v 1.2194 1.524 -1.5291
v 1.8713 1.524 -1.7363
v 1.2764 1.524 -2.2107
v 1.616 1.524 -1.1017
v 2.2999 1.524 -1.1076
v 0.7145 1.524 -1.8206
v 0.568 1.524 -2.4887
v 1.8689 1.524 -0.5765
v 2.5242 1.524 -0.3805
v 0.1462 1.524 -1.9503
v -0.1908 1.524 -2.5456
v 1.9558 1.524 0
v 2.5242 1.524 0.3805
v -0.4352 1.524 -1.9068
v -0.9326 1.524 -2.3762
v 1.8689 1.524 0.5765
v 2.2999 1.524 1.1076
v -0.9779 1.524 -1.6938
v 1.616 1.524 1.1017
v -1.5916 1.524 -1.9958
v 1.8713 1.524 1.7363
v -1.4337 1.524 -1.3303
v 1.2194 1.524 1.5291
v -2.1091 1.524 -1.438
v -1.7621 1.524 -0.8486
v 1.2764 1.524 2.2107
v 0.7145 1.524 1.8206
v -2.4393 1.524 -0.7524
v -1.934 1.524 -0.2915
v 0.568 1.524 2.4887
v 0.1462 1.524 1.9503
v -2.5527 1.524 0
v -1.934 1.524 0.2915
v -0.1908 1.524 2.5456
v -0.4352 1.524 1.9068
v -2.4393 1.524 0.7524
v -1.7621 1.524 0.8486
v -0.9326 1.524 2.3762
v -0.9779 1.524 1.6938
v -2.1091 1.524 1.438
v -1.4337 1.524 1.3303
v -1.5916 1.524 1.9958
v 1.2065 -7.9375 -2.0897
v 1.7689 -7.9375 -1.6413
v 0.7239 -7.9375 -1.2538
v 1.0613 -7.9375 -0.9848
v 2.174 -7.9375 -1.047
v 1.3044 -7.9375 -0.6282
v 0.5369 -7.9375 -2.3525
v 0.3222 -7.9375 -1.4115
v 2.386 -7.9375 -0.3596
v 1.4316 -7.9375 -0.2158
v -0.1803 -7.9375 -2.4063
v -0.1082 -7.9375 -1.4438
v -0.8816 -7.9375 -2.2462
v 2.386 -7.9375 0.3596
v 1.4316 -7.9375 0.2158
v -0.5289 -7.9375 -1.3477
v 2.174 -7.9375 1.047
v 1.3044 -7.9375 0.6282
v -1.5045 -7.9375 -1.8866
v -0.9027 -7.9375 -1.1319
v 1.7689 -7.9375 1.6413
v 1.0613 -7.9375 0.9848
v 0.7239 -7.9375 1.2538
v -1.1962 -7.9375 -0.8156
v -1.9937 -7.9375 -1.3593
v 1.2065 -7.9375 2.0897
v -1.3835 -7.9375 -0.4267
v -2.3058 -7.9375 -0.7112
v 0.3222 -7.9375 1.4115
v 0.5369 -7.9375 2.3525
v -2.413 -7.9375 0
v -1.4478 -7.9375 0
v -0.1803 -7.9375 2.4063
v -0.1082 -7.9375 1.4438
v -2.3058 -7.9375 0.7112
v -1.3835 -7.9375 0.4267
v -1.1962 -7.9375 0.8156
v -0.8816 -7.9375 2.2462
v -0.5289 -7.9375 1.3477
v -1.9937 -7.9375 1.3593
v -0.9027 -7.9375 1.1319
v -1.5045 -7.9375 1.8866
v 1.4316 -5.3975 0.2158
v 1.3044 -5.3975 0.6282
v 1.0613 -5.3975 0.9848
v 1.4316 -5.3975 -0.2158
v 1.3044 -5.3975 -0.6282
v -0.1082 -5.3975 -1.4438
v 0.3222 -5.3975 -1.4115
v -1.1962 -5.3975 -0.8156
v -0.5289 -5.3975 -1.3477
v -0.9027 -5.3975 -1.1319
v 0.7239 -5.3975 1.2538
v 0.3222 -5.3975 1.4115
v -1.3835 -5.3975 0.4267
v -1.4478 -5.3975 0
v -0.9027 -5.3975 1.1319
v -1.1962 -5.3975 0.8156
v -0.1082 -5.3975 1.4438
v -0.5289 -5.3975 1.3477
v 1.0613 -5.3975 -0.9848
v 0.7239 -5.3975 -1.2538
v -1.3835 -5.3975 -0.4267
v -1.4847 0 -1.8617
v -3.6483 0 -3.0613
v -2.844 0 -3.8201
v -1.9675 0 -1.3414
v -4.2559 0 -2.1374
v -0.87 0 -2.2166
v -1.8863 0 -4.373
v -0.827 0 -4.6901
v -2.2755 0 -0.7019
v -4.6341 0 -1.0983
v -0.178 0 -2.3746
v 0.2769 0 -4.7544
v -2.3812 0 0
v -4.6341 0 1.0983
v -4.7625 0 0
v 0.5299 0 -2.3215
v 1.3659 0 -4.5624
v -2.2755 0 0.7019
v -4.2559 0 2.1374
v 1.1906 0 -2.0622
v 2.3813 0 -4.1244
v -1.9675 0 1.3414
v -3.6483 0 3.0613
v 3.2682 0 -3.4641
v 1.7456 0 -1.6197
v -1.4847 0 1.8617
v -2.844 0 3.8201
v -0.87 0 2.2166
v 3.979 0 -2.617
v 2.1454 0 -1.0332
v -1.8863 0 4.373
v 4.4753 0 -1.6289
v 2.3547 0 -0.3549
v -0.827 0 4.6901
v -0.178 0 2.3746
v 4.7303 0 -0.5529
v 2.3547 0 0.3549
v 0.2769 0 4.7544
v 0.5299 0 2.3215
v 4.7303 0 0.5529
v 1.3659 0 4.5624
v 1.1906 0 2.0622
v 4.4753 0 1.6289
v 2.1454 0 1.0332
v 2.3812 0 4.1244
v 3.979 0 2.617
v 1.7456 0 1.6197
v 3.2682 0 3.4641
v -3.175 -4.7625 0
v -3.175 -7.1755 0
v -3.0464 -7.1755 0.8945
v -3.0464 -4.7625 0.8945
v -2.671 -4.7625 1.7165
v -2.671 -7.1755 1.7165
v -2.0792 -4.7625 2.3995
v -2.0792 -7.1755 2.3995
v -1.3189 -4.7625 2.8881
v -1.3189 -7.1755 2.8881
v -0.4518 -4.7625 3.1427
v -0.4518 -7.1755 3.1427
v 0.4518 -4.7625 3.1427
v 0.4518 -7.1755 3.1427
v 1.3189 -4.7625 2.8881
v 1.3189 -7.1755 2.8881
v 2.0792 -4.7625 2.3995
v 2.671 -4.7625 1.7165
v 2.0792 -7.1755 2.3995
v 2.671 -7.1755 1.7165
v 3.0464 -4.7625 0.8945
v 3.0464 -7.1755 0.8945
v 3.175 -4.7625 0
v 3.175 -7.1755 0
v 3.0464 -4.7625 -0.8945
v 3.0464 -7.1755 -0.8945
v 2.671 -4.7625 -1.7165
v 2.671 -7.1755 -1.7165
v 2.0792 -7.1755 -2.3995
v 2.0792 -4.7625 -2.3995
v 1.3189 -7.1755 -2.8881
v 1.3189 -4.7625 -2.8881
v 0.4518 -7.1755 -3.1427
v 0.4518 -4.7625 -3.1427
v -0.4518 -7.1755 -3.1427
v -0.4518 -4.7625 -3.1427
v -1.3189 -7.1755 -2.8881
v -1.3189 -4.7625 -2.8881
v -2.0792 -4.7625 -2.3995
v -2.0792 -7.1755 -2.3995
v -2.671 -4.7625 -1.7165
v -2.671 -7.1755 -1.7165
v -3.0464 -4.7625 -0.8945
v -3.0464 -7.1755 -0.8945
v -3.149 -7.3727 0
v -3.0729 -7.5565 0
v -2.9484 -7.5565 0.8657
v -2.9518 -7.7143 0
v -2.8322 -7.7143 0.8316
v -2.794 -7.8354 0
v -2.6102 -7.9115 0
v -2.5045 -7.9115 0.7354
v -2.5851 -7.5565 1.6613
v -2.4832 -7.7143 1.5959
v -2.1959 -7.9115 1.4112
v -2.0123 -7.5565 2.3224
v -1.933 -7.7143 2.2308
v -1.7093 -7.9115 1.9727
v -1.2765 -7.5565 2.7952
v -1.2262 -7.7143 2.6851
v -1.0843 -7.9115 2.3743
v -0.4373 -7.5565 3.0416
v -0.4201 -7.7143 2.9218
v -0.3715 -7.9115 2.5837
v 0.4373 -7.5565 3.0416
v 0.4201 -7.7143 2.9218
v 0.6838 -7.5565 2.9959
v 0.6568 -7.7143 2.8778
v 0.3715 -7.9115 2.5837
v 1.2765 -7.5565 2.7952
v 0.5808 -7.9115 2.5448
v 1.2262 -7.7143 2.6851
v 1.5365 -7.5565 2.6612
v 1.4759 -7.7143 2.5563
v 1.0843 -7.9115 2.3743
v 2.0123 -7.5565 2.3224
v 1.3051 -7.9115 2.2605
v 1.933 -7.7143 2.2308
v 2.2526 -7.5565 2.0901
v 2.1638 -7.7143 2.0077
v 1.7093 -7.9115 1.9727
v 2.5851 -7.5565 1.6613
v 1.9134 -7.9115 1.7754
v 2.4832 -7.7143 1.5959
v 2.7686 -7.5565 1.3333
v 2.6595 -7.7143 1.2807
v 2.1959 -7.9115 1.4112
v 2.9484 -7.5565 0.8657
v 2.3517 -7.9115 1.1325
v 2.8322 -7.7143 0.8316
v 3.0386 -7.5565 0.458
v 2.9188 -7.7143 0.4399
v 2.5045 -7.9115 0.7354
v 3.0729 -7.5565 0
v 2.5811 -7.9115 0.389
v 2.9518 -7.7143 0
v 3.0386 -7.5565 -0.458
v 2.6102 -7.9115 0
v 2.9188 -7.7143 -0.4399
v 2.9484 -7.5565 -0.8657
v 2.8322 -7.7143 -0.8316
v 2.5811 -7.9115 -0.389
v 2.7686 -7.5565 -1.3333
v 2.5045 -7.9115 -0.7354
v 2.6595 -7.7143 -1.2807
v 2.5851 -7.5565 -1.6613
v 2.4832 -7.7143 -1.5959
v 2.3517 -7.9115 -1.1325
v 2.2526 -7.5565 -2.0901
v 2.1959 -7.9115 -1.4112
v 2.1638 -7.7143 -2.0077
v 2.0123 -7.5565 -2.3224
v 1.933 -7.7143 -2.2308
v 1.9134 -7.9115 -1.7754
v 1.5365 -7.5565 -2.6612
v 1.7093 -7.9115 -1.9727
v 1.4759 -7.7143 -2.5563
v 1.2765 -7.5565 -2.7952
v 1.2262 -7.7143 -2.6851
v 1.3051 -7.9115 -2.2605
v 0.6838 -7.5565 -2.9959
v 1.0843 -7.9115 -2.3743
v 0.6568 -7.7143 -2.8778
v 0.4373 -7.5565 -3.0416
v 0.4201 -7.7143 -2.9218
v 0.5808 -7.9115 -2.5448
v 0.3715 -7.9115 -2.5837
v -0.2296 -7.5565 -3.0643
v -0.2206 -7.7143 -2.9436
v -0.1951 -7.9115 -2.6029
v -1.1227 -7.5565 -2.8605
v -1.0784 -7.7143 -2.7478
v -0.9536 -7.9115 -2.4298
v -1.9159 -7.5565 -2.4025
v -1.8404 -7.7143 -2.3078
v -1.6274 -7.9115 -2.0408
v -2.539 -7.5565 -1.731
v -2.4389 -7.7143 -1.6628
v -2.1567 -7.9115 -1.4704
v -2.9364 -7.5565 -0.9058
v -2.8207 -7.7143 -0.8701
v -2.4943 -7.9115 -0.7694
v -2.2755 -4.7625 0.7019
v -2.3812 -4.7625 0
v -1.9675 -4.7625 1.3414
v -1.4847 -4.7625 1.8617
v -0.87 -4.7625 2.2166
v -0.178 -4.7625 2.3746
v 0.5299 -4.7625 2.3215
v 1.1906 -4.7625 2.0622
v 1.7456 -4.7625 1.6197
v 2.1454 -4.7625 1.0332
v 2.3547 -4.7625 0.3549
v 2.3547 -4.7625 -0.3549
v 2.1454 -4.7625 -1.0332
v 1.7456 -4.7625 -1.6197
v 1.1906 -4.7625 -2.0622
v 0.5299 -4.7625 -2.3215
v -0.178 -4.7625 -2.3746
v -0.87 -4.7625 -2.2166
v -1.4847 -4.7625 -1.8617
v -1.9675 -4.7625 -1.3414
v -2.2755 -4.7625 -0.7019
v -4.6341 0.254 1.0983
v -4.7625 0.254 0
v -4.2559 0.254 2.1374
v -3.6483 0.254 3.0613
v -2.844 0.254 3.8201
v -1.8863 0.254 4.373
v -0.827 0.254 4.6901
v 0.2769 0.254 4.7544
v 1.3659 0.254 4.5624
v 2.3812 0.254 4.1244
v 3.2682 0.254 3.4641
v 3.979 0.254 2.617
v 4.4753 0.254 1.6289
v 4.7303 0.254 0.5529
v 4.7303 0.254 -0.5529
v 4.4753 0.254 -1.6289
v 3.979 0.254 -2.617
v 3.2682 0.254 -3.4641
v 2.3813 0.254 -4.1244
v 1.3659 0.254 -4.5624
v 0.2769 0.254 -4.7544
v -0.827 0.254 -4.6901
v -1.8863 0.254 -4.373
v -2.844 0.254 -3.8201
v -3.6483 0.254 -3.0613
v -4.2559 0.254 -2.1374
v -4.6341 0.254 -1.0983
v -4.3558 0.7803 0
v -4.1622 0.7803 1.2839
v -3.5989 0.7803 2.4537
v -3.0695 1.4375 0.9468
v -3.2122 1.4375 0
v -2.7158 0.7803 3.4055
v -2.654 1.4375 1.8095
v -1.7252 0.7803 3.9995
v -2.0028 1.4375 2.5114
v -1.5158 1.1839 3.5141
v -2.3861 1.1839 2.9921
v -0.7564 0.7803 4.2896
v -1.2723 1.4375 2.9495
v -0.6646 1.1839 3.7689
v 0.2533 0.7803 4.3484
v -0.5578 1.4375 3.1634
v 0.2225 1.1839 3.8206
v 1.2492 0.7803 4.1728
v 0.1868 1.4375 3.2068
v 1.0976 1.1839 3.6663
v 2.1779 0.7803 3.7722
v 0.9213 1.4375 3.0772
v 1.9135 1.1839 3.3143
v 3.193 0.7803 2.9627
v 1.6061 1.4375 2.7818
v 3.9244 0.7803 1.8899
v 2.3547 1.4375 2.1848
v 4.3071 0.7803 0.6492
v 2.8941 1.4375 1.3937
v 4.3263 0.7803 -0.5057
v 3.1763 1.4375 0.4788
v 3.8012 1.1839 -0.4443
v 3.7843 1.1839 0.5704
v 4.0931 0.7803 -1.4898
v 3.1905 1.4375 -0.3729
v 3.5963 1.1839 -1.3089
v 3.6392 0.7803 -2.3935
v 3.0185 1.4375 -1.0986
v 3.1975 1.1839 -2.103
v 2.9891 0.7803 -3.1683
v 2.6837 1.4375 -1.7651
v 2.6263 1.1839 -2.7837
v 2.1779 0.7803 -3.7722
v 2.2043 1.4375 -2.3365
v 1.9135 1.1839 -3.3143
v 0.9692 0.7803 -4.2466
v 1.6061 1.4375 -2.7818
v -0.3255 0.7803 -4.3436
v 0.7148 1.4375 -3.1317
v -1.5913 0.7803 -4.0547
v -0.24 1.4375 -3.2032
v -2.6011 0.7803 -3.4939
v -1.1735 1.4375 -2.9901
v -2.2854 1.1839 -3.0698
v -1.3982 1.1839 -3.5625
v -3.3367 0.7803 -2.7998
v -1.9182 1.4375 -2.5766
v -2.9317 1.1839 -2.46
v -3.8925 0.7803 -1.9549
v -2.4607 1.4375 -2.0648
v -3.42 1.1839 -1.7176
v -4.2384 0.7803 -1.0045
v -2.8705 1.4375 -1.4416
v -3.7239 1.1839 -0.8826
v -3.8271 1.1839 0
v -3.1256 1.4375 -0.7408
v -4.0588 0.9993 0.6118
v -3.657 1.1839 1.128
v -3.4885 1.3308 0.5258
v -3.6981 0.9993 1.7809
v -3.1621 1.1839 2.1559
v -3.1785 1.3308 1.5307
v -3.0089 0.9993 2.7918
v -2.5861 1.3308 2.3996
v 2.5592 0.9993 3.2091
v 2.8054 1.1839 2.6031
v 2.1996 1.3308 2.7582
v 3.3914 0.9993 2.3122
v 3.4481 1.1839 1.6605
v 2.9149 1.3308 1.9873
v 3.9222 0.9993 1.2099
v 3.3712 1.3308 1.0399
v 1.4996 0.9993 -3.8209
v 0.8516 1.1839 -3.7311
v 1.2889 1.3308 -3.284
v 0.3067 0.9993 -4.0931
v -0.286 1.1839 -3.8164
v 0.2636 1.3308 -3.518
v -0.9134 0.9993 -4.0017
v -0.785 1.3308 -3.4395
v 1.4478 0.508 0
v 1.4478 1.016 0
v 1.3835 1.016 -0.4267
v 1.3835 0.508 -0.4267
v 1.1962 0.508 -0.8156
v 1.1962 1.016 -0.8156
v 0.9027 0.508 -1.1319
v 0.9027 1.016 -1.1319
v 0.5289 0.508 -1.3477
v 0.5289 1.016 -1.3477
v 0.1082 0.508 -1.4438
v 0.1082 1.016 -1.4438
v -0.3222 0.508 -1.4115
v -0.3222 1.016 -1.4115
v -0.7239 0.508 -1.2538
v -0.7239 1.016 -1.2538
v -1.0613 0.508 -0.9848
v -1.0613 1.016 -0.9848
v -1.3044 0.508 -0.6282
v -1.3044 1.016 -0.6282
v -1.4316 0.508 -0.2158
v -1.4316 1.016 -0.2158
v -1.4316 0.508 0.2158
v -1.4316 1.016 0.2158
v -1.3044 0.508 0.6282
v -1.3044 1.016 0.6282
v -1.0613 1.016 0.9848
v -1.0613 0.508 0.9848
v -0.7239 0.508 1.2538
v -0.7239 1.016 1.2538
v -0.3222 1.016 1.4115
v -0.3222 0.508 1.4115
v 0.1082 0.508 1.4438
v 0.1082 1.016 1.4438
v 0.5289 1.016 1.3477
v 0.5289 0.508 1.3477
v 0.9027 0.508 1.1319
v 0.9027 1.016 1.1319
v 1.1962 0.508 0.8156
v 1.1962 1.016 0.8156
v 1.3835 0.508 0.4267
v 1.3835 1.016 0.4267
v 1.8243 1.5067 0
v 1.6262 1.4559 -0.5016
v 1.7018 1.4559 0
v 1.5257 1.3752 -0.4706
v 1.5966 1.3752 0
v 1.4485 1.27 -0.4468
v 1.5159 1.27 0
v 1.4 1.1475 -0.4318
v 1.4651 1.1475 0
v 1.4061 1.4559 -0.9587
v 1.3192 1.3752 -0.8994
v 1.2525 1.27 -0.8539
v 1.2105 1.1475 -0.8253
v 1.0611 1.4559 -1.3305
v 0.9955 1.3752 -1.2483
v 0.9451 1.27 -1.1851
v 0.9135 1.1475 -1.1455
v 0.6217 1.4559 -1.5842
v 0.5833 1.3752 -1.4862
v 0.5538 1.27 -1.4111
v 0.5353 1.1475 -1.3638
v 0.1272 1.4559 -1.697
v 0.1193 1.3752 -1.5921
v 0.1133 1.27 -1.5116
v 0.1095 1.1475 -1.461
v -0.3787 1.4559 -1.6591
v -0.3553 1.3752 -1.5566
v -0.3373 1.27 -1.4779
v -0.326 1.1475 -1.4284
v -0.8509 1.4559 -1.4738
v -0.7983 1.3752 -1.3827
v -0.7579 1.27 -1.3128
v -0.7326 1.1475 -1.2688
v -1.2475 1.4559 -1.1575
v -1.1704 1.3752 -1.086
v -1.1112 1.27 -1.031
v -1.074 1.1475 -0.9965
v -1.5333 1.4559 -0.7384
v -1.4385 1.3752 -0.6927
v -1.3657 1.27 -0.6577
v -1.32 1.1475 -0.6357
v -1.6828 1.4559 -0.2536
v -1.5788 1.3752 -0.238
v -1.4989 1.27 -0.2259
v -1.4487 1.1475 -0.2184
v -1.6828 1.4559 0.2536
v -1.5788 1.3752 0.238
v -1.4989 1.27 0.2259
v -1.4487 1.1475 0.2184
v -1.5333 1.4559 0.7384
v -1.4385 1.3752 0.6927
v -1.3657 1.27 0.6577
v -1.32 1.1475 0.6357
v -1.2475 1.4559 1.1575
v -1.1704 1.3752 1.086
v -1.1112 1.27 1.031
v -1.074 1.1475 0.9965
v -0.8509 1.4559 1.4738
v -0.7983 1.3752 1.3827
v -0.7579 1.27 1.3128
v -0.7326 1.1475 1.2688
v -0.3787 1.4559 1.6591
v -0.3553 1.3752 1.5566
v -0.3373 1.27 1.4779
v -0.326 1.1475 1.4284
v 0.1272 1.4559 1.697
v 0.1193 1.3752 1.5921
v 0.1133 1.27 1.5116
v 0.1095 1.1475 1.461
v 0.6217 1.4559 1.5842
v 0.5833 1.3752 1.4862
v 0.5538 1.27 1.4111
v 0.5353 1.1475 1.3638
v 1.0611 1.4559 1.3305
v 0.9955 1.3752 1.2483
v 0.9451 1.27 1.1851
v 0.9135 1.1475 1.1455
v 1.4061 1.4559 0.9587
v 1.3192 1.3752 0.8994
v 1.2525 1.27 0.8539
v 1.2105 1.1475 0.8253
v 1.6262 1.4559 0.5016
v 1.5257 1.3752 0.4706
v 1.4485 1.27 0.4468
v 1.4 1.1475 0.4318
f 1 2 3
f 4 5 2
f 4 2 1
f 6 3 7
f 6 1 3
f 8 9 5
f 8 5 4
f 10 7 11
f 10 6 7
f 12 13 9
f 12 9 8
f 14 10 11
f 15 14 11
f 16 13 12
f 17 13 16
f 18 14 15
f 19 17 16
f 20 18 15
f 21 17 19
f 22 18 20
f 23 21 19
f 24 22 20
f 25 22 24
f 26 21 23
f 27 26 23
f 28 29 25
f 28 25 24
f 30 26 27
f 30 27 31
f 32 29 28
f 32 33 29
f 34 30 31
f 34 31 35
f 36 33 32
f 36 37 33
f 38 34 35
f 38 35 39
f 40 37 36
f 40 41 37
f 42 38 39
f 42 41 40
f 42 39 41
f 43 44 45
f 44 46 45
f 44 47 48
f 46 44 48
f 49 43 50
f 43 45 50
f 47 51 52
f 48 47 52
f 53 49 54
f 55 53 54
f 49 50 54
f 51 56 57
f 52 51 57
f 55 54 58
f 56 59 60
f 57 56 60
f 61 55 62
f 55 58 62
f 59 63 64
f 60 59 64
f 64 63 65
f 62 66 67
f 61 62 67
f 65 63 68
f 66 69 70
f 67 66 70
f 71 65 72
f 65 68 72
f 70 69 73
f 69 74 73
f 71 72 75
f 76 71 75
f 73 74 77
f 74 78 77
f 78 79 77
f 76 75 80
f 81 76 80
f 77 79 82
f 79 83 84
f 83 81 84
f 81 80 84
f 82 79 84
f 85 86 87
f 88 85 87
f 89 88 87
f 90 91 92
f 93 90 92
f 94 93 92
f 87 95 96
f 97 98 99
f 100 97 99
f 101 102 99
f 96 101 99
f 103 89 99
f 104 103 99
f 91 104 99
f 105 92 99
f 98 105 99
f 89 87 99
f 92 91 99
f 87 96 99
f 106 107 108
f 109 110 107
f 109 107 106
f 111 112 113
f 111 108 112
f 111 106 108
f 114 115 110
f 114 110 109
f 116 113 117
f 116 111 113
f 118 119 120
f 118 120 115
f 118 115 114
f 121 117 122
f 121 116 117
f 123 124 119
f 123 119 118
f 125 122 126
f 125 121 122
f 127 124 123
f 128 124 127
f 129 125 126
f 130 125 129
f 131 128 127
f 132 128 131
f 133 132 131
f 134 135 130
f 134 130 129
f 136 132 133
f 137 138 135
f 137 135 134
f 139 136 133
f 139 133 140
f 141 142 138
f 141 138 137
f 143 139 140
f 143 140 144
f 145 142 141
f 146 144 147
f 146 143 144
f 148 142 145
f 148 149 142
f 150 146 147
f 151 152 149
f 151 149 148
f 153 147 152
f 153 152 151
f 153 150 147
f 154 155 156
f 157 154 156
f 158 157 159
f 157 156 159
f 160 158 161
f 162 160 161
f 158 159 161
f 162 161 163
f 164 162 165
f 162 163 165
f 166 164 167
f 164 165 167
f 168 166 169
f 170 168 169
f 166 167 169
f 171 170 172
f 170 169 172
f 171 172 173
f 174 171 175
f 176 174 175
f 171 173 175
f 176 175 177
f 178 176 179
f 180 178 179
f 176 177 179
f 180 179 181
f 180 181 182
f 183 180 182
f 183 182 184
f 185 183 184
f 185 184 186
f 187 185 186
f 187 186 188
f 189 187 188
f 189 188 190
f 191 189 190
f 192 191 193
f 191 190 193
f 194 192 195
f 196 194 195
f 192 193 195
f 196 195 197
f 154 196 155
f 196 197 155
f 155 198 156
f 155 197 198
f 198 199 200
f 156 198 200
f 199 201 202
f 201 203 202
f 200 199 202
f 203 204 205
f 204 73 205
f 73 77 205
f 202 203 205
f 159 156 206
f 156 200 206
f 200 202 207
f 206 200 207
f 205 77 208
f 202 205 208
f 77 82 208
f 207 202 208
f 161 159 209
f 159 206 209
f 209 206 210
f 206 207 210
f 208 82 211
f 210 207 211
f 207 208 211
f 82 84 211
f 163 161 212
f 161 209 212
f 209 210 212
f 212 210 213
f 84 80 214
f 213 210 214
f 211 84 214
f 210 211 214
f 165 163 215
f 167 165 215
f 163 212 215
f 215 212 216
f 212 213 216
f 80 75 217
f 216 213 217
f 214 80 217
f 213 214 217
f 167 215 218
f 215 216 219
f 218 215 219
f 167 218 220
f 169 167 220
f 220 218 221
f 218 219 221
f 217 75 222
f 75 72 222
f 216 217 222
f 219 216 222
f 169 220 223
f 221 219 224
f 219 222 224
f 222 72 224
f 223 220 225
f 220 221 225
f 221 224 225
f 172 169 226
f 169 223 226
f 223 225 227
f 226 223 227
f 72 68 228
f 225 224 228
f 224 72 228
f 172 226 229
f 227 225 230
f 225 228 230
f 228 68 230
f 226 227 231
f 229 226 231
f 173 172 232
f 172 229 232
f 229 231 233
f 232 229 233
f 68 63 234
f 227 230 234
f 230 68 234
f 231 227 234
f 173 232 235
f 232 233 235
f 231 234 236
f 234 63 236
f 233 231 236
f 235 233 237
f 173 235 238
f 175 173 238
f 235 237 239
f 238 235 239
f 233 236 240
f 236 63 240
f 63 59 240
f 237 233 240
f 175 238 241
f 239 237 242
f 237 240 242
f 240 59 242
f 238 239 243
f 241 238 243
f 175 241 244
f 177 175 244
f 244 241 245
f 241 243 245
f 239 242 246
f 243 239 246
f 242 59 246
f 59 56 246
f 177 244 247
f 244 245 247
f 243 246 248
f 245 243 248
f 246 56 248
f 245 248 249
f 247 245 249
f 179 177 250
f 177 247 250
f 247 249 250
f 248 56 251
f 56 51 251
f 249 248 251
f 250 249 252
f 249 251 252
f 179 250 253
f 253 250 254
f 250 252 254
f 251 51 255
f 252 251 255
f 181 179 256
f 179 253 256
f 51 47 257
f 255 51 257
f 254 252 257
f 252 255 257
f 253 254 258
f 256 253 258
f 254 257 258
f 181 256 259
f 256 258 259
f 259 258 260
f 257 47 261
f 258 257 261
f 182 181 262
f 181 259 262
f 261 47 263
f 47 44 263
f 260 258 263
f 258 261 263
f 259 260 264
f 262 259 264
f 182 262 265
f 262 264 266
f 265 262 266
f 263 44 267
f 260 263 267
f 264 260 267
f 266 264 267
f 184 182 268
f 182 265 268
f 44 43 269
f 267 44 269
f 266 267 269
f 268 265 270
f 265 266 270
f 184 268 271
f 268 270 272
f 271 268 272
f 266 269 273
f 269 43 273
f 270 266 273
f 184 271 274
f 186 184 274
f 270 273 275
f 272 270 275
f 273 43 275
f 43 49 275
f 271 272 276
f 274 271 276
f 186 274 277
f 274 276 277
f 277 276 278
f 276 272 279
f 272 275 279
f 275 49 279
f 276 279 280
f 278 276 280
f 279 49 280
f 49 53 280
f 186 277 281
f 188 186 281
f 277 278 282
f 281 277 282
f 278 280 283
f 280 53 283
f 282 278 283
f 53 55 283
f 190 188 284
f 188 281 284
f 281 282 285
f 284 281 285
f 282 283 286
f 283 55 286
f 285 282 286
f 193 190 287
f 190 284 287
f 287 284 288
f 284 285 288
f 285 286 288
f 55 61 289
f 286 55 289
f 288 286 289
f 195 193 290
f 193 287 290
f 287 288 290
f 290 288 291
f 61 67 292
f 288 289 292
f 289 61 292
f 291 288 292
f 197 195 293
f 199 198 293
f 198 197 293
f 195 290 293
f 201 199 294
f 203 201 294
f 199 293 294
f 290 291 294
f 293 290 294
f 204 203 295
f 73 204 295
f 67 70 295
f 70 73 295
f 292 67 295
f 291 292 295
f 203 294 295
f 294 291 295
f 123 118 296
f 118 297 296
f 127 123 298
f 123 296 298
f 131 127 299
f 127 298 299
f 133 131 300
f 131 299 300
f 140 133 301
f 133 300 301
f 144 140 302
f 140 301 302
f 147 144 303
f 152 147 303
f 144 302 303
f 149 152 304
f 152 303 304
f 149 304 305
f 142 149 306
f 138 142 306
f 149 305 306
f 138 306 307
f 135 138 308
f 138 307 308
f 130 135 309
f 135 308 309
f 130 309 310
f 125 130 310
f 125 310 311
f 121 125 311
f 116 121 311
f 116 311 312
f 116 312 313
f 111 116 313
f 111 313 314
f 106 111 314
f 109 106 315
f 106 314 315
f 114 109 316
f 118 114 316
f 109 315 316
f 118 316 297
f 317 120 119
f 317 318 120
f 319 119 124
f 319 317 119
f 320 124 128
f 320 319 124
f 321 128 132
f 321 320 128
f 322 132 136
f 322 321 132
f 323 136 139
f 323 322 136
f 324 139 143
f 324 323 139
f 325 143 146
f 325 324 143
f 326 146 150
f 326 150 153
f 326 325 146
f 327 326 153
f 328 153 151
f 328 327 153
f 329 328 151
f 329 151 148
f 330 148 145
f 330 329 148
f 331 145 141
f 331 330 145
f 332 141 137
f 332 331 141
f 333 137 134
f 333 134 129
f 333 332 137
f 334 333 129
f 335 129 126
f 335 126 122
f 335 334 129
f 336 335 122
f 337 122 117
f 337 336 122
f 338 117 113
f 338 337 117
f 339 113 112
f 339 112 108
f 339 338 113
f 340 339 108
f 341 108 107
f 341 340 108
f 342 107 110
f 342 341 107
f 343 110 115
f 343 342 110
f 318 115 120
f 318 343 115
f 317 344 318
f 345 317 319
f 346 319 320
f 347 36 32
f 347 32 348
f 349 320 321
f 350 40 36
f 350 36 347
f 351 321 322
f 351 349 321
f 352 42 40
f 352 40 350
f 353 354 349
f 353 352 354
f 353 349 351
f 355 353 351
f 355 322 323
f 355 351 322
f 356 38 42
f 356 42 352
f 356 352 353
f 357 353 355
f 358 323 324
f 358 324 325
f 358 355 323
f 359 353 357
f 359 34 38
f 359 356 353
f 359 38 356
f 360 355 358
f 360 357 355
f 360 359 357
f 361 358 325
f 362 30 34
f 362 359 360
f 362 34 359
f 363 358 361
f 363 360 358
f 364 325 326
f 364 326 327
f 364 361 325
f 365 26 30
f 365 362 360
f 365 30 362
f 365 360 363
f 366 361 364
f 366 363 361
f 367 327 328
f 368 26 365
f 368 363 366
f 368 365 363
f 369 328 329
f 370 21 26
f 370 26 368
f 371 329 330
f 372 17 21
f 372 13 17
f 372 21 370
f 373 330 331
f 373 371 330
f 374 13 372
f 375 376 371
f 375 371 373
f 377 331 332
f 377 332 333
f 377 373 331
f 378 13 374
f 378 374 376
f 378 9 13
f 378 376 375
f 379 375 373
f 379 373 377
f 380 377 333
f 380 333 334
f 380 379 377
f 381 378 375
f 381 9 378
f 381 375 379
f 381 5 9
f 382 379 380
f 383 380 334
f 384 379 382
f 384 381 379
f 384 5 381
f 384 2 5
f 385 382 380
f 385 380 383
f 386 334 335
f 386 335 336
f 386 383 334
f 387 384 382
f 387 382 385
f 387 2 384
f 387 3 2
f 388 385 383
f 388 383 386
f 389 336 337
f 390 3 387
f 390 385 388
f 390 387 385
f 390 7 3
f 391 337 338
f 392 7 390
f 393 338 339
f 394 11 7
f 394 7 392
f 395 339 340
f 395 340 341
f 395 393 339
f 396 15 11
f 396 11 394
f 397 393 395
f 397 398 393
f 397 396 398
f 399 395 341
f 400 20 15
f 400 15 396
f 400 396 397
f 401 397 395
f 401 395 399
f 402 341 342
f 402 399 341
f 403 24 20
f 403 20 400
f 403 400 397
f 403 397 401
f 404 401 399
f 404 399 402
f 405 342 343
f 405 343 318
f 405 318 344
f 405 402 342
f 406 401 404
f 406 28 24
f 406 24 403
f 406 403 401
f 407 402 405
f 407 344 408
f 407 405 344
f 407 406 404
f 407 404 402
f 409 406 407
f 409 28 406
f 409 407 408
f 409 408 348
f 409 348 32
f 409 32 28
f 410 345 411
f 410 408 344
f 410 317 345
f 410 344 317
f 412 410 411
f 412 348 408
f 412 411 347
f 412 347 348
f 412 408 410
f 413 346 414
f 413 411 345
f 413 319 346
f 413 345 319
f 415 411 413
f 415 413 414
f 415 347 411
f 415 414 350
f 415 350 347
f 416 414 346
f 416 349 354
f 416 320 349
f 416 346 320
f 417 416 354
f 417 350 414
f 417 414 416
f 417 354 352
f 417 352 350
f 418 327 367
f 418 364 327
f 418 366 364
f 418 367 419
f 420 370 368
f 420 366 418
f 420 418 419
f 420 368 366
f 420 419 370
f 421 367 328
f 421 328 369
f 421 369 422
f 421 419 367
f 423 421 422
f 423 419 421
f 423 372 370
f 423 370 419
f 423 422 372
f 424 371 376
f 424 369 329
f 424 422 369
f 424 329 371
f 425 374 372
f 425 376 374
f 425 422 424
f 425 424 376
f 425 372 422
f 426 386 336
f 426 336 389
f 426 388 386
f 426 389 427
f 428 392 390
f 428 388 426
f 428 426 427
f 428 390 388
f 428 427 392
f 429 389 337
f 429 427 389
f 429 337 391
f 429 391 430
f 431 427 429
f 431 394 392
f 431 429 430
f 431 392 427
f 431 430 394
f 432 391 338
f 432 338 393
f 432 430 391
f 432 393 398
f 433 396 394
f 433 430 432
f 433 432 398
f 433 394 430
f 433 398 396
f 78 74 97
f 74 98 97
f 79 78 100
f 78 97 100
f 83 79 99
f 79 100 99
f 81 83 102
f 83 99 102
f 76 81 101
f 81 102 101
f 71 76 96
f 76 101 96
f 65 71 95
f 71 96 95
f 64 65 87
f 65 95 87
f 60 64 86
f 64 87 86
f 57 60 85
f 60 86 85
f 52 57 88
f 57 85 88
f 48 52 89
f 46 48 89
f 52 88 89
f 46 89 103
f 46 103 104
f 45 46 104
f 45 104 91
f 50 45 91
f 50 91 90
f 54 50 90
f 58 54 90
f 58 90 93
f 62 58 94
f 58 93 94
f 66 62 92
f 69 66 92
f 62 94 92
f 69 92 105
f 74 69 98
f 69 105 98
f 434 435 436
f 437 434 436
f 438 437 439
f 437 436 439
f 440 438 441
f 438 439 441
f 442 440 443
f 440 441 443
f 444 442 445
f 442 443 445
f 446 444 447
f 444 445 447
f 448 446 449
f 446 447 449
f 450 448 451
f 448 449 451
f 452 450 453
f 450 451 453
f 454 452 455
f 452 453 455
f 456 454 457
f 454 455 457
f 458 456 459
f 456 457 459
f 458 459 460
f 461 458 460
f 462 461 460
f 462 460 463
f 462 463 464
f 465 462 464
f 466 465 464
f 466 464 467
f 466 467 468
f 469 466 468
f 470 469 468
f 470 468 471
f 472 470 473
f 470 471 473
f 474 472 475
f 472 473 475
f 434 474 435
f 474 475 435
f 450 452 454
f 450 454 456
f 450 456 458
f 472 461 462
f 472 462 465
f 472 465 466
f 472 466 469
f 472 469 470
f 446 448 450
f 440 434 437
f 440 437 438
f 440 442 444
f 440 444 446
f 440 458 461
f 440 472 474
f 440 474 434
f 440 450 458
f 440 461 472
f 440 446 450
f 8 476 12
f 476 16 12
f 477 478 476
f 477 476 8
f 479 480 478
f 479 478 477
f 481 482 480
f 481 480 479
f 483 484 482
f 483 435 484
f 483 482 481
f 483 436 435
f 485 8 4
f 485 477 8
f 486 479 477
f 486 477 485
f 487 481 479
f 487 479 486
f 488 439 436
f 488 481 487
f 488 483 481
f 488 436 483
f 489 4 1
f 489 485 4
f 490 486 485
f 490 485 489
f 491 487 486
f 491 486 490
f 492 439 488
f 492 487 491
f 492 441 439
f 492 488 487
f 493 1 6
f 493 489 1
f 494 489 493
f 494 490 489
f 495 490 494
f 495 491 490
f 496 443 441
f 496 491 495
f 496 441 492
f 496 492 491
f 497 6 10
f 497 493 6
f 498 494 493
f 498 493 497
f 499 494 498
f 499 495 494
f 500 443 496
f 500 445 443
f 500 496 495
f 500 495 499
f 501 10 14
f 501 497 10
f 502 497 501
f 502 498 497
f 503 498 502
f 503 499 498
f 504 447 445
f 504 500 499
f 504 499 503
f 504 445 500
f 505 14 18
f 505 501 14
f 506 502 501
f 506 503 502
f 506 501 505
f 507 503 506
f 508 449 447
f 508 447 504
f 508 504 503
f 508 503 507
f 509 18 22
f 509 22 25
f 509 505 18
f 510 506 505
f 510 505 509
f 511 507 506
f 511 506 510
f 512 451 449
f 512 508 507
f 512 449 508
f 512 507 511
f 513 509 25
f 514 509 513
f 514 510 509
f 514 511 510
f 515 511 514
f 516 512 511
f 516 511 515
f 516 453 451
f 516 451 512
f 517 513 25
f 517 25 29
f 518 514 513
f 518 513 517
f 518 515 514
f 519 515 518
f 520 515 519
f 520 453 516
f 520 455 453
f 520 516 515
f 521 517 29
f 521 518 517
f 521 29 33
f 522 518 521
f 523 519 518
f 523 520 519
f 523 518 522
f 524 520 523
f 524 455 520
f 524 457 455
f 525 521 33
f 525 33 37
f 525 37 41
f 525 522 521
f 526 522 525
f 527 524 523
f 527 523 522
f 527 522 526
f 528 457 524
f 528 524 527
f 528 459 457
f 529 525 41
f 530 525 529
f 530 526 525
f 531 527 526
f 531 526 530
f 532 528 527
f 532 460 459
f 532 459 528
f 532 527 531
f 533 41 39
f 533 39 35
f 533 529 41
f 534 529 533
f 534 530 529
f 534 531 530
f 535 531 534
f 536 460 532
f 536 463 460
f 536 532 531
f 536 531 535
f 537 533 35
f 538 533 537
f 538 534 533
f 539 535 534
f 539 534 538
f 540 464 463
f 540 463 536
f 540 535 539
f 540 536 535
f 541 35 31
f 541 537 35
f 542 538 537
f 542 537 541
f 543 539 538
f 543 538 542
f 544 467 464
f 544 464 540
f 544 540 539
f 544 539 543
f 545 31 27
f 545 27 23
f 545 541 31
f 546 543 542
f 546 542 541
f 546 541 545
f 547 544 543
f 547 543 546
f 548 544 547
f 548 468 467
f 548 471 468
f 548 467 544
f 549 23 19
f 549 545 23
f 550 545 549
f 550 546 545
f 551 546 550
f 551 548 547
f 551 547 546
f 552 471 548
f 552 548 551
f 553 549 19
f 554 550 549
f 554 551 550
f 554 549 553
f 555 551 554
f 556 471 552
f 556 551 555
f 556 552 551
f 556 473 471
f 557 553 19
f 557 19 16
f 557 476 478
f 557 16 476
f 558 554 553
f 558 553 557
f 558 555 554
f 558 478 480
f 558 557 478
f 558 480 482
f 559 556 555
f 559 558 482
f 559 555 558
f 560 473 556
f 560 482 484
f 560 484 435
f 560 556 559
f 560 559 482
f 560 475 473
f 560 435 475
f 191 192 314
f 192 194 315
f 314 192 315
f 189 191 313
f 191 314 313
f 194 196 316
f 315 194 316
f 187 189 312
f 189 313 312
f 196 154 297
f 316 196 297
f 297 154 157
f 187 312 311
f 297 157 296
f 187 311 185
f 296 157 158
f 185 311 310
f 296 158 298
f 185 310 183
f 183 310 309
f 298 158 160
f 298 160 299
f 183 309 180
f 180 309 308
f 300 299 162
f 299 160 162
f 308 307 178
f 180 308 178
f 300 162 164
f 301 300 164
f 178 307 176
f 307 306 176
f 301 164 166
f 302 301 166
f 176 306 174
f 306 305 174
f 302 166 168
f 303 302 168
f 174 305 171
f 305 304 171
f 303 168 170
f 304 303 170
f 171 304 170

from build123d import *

# Parameters (mm, degrees)
SKETCH3_R          = 1.4478
CUT_EXTRUDE1_DEPTH = 1.016
FILLET1_R          = 0.508
FILLET3_R          = 0.762


with BuildPart() as part:
    # Sketch2 → Revolve1 (revolve)
    with BuildSketch(Plane.XY):
        with BuildLine():
            Line((0, 0), (-4.7625, 0))
            Line((-4.7625, 0), (-4.7625, 0.254))
            ThreePointArc((-4.7625, 0.254), (-3.827073968, 1.183884704), (-2.5527, 1.524))
            Line((-2.5527, 1.524), (0, 1.524))
            Line((0, 1.524), (0, 0))
        make_face()
    revolve(axis=Axis((0, -4.155418325, 0), (0, 1, 0)))

    # Sketch3 → Cut-Extrude1 (cut)
    with BuildSketch(Plane(origin=(0, 1.524, 0), x_dir=(1, 0, 0), z_dir=(0, 1, 0))):
        Circle(SKETCH3_R)
    extrude(amount=-CUT_EXTRUDE1_DEPTH, mode=Mode.SUBTRACT)

    # Fillet1
    fillet1_edges = [part.edges().sort_by_distance(p)[0] for p in [
        (-1.4478, 1.524, 0),
    ]]
    fillet(fillet1_edges, radius=FILLET1_R)

    # Sketch5 → Revolve3 (revolve)
    with BuildSketch(Plane.XY):
        Polygon((0, 0), (-2.38125, 0), (-2.38125, -4.7625), (-3.175, -4.7625), (-3.175, -7.9375), (-1.4478, -7.9375), (-1.4478, -5.3975), (0, -5.3975), align=None)
    revolve(axis=Axis((0, 0, 0), (0, 1, 0)))

    # Fillet3
    fillet3_edges = [part.edges().sort_by_distance(p)[0] for p in [
        (3.175, -7.9375, 0),
    ]]
    fillet(fillet3_edges, radius=FILLET3_R)


solid = part.part
